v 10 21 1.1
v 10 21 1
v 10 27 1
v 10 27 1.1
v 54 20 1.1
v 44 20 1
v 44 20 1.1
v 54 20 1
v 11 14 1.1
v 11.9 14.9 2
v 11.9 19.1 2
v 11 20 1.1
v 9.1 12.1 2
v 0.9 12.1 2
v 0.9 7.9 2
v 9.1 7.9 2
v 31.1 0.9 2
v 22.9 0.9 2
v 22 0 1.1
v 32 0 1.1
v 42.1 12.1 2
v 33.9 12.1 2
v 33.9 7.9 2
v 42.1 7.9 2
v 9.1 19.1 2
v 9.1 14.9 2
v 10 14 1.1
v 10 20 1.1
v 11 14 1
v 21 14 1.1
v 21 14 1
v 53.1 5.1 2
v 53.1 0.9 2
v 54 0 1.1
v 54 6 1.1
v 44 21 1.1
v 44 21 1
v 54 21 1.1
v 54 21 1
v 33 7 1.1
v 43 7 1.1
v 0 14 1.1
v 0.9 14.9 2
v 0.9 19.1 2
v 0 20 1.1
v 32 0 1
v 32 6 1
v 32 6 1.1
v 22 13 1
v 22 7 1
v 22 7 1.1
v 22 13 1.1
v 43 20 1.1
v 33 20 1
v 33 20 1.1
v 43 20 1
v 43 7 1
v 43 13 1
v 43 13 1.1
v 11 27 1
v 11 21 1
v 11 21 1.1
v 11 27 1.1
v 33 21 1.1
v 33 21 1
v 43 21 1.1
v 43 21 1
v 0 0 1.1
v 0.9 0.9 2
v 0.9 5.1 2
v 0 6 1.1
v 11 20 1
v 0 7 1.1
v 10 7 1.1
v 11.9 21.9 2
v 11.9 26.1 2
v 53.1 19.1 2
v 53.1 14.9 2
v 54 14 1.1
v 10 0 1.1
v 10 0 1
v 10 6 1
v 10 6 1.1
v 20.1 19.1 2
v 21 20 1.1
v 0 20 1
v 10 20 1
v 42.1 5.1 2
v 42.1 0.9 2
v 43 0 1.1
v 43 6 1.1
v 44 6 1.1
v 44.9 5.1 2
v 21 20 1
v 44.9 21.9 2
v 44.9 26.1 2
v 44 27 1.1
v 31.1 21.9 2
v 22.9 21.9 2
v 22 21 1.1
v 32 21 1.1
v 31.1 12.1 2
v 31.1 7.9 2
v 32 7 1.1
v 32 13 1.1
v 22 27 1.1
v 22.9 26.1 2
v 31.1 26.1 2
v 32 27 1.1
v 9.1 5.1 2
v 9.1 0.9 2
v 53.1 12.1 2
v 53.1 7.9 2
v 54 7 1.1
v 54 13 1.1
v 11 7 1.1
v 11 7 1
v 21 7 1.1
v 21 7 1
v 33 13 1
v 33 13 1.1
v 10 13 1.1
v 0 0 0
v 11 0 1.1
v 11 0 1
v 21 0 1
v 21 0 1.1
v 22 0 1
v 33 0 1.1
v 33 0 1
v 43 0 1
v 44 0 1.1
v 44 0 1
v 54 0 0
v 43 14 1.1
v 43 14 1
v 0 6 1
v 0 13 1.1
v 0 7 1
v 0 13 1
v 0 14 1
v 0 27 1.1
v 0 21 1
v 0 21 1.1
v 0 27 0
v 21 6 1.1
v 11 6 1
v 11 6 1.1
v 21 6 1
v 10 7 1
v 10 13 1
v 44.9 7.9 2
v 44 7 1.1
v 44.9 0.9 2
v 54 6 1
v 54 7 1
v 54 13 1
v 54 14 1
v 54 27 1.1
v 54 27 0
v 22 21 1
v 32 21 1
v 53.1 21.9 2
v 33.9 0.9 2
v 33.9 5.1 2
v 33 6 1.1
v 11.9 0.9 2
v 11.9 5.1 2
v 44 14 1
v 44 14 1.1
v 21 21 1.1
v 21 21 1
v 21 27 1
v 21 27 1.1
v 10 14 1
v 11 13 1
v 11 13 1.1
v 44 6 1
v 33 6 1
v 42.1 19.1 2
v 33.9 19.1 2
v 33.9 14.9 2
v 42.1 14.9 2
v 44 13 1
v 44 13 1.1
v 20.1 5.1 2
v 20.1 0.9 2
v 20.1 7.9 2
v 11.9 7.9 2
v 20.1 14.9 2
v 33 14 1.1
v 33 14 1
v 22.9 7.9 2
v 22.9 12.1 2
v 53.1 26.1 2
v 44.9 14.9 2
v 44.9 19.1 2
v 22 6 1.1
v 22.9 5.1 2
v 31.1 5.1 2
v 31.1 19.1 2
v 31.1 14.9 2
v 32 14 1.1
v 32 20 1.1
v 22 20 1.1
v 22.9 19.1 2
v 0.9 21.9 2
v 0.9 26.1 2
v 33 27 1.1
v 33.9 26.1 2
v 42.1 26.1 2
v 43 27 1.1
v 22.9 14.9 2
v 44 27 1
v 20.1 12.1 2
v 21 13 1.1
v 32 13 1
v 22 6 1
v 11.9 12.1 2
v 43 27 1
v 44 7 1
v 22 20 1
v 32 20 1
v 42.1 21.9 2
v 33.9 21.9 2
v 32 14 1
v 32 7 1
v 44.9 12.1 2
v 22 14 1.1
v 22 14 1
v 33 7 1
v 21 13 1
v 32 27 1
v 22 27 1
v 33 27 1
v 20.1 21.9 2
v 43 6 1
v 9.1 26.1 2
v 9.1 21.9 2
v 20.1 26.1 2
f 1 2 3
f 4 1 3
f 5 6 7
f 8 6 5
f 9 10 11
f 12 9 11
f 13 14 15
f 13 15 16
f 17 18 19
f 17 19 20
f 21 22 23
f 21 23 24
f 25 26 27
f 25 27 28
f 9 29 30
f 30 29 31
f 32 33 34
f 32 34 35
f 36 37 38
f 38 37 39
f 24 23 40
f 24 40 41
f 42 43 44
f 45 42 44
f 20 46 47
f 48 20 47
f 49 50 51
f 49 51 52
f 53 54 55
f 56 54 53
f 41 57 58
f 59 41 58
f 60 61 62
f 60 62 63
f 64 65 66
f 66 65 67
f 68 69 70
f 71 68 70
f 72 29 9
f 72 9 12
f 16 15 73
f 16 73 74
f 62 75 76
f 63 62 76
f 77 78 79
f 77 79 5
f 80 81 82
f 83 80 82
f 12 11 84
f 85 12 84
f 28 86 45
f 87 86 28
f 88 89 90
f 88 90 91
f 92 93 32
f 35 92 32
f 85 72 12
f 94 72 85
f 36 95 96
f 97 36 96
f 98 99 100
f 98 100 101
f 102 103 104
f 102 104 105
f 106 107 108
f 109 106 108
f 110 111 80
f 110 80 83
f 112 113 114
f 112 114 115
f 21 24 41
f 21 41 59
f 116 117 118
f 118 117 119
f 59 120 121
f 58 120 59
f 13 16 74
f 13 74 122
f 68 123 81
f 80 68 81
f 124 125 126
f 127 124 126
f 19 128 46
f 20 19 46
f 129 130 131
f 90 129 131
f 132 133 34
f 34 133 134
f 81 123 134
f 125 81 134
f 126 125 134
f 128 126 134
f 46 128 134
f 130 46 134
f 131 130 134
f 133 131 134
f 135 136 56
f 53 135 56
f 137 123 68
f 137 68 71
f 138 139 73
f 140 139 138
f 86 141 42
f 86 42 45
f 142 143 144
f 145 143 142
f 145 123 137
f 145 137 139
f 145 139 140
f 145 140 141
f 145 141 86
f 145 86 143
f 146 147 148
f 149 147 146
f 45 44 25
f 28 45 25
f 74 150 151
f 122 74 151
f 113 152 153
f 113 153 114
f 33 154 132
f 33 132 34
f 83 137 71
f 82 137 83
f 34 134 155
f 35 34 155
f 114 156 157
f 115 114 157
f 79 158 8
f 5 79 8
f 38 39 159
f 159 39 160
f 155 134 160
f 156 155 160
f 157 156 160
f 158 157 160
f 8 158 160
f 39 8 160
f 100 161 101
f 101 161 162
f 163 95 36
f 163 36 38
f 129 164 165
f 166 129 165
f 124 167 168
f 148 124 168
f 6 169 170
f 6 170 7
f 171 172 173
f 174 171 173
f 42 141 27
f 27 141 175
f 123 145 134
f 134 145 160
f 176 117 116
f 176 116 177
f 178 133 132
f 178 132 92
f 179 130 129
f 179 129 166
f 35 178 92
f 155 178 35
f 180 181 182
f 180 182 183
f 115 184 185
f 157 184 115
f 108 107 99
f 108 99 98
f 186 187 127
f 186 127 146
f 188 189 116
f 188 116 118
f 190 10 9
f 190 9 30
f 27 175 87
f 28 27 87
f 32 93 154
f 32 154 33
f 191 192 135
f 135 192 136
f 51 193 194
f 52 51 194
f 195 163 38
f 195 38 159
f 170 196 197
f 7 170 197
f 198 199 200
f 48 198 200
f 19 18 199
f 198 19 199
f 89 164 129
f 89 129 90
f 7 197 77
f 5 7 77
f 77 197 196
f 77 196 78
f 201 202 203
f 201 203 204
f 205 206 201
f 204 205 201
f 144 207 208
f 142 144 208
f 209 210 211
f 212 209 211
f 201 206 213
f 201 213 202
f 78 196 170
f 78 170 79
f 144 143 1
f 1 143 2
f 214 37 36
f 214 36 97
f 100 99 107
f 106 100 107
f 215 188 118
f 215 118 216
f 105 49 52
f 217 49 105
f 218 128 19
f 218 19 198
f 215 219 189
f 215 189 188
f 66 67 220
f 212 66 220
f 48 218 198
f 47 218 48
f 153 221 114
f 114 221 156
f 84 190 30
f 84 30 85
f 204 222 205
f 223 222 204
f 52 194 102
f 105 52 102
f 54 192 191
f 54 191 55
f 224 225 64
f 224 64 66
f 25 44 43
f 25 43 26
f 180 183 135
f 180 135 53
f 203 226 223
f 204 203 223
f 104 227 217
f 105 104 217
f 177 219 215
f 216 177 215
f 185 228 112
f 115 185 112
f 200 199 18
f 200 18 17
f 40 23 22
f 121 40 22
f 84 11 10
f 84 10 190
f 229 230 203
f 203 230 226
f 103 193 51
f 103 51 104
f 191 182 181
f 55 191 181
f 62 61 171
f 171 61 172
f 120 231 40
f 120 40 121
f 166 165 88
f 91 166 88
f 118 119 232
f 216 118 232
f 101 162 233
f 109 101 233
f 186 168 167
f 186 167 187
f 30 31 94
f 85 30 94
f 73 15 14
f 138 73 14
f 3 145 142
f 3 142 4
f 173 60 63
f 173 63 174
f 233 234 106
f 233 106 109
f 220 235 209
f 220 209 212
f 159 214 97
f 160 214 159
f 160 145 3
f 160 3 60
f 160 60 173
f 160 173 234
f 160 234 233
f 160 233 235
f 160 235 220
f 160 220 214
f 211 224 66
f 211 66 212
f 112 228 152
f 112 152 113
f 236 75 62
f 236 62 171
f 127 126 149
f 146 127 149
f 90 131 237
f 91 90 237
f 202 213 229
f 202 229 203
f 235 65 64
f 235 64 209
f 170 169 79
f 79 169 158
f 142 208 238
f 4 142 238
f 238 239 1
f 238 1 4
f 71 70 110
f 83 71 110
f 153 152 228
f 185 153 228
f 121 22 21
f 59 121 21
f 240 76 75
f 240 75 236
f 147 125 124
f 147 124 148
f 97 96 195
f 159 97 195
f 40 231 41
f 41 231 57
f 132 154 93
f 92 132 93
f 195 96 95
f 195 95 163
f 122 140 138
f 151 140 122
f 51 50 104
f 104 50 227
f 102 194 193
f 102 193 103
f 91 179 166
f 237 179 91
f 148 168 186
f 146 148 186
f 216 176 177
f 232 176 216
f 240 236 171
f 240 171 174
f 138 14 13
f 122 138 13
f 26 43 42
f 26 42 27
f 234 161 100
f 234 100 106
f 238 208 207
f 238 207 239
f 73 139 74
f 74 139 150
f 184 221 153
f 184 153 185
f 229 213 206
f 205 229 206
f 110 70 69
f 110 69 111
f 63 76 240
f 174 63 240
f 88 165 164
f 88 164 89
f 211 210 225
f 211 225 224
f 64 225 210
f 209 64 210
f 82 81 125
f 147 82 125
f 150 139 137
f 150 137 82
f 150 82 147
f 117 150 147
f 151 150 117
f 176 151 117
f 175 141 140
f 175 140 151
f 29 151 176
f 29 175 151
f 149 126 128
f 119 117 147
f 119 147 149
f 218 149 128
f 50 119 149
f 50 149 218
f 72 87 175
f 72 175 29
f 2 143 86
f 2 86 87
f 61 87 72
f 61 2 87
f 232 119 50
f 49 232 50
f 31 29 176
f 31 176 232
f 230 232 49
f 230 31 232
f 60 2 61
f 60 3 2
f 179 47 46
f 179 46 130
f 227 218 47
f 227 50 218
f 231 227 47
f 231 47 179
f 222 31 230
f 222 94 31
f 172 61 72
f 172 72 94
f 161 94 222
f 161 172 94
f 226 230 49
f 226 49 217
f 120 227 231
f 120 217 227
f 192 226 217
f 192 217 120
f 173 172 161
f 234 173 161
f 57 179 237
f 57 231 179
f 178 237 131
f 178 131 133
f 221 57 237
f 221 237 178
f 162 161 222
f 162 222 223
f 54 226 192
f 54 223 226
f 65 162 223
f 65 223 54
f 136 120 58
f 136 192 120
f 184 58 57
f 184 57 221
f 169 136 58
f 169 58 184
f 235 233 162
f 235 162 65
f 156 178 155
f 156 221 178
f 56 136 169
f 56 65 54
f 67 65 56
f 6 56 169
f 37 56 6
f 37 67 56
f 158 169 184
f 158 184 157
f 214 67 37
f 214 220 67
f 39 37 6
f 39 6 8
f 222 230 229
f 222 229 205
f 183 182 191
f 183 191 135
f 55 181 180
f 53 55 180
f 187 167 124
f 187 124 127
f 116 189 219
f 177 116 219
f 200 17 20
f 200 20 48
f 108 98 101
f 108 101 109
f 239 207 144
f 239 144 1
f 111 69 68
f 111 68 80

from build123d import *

# Parameters (mm, degrees)
BOX001_W      = 10
BOX001_H      = 6
BOX001_DEPTH  = 1
CHAMFER_SIZE  = 0.9
ARRAY_X_COUNT = 5
ARRAY_X_PITCH = 11
ARRAY_Y_COUNT = 4
ARRAY_Y_PITCH = 7
BOX_W         = 54
BOX_H         = 27
BOX_DEPTH     = 1


with BuildPart() as array:
    # Box001 → Box001 (new body)
    with BuildSketch(Plane.XY.offset(1)):
        with Locations((5, 3)):
            Rectangle(BOX001_W, BOX001_H)
    extrude(amount=BOX001_DEPTH)

    # Chamfer
    chamfer_edges = [array.edges().sort_by_distance(p)[0] for p in [
        (0, 3, 2),
        (10, 3, 2),
        (5, 0, 2),
        (5, 6, 2),
    ]]
    chamfer(chamfer_edges, length=CHAMFER_SIZE)

    # Array X: Array ×5


with BuildPart() as array_1:
    add(array.part)
    with Locations(*[(i * ARRAY_X_PITCH, 0, 0) for i in range(1, ARRAY_X_COUNT)]):
        add(array.part)

    # Array Y: Array ×4


with BuildPart() as array_2:
    add(array_1.part)
    with Locations(*[(0, i * ARRAY_Y_PITCH, 0) for i in range(1, ARRAY_Y_COUNT)]):
        add(array_1.part)


with BuildPart() as fusion:
    # Box → Box (new body)
    with BuildSketch(Plane.XY):
        with Locations((27, 13.5)):
            Rectangle(BOX_W, BOX_H)
    extrude(amount=BOX_DEPTH)

    # Fusion: union Array
    add(array_2.part)


solid = fusion.part
